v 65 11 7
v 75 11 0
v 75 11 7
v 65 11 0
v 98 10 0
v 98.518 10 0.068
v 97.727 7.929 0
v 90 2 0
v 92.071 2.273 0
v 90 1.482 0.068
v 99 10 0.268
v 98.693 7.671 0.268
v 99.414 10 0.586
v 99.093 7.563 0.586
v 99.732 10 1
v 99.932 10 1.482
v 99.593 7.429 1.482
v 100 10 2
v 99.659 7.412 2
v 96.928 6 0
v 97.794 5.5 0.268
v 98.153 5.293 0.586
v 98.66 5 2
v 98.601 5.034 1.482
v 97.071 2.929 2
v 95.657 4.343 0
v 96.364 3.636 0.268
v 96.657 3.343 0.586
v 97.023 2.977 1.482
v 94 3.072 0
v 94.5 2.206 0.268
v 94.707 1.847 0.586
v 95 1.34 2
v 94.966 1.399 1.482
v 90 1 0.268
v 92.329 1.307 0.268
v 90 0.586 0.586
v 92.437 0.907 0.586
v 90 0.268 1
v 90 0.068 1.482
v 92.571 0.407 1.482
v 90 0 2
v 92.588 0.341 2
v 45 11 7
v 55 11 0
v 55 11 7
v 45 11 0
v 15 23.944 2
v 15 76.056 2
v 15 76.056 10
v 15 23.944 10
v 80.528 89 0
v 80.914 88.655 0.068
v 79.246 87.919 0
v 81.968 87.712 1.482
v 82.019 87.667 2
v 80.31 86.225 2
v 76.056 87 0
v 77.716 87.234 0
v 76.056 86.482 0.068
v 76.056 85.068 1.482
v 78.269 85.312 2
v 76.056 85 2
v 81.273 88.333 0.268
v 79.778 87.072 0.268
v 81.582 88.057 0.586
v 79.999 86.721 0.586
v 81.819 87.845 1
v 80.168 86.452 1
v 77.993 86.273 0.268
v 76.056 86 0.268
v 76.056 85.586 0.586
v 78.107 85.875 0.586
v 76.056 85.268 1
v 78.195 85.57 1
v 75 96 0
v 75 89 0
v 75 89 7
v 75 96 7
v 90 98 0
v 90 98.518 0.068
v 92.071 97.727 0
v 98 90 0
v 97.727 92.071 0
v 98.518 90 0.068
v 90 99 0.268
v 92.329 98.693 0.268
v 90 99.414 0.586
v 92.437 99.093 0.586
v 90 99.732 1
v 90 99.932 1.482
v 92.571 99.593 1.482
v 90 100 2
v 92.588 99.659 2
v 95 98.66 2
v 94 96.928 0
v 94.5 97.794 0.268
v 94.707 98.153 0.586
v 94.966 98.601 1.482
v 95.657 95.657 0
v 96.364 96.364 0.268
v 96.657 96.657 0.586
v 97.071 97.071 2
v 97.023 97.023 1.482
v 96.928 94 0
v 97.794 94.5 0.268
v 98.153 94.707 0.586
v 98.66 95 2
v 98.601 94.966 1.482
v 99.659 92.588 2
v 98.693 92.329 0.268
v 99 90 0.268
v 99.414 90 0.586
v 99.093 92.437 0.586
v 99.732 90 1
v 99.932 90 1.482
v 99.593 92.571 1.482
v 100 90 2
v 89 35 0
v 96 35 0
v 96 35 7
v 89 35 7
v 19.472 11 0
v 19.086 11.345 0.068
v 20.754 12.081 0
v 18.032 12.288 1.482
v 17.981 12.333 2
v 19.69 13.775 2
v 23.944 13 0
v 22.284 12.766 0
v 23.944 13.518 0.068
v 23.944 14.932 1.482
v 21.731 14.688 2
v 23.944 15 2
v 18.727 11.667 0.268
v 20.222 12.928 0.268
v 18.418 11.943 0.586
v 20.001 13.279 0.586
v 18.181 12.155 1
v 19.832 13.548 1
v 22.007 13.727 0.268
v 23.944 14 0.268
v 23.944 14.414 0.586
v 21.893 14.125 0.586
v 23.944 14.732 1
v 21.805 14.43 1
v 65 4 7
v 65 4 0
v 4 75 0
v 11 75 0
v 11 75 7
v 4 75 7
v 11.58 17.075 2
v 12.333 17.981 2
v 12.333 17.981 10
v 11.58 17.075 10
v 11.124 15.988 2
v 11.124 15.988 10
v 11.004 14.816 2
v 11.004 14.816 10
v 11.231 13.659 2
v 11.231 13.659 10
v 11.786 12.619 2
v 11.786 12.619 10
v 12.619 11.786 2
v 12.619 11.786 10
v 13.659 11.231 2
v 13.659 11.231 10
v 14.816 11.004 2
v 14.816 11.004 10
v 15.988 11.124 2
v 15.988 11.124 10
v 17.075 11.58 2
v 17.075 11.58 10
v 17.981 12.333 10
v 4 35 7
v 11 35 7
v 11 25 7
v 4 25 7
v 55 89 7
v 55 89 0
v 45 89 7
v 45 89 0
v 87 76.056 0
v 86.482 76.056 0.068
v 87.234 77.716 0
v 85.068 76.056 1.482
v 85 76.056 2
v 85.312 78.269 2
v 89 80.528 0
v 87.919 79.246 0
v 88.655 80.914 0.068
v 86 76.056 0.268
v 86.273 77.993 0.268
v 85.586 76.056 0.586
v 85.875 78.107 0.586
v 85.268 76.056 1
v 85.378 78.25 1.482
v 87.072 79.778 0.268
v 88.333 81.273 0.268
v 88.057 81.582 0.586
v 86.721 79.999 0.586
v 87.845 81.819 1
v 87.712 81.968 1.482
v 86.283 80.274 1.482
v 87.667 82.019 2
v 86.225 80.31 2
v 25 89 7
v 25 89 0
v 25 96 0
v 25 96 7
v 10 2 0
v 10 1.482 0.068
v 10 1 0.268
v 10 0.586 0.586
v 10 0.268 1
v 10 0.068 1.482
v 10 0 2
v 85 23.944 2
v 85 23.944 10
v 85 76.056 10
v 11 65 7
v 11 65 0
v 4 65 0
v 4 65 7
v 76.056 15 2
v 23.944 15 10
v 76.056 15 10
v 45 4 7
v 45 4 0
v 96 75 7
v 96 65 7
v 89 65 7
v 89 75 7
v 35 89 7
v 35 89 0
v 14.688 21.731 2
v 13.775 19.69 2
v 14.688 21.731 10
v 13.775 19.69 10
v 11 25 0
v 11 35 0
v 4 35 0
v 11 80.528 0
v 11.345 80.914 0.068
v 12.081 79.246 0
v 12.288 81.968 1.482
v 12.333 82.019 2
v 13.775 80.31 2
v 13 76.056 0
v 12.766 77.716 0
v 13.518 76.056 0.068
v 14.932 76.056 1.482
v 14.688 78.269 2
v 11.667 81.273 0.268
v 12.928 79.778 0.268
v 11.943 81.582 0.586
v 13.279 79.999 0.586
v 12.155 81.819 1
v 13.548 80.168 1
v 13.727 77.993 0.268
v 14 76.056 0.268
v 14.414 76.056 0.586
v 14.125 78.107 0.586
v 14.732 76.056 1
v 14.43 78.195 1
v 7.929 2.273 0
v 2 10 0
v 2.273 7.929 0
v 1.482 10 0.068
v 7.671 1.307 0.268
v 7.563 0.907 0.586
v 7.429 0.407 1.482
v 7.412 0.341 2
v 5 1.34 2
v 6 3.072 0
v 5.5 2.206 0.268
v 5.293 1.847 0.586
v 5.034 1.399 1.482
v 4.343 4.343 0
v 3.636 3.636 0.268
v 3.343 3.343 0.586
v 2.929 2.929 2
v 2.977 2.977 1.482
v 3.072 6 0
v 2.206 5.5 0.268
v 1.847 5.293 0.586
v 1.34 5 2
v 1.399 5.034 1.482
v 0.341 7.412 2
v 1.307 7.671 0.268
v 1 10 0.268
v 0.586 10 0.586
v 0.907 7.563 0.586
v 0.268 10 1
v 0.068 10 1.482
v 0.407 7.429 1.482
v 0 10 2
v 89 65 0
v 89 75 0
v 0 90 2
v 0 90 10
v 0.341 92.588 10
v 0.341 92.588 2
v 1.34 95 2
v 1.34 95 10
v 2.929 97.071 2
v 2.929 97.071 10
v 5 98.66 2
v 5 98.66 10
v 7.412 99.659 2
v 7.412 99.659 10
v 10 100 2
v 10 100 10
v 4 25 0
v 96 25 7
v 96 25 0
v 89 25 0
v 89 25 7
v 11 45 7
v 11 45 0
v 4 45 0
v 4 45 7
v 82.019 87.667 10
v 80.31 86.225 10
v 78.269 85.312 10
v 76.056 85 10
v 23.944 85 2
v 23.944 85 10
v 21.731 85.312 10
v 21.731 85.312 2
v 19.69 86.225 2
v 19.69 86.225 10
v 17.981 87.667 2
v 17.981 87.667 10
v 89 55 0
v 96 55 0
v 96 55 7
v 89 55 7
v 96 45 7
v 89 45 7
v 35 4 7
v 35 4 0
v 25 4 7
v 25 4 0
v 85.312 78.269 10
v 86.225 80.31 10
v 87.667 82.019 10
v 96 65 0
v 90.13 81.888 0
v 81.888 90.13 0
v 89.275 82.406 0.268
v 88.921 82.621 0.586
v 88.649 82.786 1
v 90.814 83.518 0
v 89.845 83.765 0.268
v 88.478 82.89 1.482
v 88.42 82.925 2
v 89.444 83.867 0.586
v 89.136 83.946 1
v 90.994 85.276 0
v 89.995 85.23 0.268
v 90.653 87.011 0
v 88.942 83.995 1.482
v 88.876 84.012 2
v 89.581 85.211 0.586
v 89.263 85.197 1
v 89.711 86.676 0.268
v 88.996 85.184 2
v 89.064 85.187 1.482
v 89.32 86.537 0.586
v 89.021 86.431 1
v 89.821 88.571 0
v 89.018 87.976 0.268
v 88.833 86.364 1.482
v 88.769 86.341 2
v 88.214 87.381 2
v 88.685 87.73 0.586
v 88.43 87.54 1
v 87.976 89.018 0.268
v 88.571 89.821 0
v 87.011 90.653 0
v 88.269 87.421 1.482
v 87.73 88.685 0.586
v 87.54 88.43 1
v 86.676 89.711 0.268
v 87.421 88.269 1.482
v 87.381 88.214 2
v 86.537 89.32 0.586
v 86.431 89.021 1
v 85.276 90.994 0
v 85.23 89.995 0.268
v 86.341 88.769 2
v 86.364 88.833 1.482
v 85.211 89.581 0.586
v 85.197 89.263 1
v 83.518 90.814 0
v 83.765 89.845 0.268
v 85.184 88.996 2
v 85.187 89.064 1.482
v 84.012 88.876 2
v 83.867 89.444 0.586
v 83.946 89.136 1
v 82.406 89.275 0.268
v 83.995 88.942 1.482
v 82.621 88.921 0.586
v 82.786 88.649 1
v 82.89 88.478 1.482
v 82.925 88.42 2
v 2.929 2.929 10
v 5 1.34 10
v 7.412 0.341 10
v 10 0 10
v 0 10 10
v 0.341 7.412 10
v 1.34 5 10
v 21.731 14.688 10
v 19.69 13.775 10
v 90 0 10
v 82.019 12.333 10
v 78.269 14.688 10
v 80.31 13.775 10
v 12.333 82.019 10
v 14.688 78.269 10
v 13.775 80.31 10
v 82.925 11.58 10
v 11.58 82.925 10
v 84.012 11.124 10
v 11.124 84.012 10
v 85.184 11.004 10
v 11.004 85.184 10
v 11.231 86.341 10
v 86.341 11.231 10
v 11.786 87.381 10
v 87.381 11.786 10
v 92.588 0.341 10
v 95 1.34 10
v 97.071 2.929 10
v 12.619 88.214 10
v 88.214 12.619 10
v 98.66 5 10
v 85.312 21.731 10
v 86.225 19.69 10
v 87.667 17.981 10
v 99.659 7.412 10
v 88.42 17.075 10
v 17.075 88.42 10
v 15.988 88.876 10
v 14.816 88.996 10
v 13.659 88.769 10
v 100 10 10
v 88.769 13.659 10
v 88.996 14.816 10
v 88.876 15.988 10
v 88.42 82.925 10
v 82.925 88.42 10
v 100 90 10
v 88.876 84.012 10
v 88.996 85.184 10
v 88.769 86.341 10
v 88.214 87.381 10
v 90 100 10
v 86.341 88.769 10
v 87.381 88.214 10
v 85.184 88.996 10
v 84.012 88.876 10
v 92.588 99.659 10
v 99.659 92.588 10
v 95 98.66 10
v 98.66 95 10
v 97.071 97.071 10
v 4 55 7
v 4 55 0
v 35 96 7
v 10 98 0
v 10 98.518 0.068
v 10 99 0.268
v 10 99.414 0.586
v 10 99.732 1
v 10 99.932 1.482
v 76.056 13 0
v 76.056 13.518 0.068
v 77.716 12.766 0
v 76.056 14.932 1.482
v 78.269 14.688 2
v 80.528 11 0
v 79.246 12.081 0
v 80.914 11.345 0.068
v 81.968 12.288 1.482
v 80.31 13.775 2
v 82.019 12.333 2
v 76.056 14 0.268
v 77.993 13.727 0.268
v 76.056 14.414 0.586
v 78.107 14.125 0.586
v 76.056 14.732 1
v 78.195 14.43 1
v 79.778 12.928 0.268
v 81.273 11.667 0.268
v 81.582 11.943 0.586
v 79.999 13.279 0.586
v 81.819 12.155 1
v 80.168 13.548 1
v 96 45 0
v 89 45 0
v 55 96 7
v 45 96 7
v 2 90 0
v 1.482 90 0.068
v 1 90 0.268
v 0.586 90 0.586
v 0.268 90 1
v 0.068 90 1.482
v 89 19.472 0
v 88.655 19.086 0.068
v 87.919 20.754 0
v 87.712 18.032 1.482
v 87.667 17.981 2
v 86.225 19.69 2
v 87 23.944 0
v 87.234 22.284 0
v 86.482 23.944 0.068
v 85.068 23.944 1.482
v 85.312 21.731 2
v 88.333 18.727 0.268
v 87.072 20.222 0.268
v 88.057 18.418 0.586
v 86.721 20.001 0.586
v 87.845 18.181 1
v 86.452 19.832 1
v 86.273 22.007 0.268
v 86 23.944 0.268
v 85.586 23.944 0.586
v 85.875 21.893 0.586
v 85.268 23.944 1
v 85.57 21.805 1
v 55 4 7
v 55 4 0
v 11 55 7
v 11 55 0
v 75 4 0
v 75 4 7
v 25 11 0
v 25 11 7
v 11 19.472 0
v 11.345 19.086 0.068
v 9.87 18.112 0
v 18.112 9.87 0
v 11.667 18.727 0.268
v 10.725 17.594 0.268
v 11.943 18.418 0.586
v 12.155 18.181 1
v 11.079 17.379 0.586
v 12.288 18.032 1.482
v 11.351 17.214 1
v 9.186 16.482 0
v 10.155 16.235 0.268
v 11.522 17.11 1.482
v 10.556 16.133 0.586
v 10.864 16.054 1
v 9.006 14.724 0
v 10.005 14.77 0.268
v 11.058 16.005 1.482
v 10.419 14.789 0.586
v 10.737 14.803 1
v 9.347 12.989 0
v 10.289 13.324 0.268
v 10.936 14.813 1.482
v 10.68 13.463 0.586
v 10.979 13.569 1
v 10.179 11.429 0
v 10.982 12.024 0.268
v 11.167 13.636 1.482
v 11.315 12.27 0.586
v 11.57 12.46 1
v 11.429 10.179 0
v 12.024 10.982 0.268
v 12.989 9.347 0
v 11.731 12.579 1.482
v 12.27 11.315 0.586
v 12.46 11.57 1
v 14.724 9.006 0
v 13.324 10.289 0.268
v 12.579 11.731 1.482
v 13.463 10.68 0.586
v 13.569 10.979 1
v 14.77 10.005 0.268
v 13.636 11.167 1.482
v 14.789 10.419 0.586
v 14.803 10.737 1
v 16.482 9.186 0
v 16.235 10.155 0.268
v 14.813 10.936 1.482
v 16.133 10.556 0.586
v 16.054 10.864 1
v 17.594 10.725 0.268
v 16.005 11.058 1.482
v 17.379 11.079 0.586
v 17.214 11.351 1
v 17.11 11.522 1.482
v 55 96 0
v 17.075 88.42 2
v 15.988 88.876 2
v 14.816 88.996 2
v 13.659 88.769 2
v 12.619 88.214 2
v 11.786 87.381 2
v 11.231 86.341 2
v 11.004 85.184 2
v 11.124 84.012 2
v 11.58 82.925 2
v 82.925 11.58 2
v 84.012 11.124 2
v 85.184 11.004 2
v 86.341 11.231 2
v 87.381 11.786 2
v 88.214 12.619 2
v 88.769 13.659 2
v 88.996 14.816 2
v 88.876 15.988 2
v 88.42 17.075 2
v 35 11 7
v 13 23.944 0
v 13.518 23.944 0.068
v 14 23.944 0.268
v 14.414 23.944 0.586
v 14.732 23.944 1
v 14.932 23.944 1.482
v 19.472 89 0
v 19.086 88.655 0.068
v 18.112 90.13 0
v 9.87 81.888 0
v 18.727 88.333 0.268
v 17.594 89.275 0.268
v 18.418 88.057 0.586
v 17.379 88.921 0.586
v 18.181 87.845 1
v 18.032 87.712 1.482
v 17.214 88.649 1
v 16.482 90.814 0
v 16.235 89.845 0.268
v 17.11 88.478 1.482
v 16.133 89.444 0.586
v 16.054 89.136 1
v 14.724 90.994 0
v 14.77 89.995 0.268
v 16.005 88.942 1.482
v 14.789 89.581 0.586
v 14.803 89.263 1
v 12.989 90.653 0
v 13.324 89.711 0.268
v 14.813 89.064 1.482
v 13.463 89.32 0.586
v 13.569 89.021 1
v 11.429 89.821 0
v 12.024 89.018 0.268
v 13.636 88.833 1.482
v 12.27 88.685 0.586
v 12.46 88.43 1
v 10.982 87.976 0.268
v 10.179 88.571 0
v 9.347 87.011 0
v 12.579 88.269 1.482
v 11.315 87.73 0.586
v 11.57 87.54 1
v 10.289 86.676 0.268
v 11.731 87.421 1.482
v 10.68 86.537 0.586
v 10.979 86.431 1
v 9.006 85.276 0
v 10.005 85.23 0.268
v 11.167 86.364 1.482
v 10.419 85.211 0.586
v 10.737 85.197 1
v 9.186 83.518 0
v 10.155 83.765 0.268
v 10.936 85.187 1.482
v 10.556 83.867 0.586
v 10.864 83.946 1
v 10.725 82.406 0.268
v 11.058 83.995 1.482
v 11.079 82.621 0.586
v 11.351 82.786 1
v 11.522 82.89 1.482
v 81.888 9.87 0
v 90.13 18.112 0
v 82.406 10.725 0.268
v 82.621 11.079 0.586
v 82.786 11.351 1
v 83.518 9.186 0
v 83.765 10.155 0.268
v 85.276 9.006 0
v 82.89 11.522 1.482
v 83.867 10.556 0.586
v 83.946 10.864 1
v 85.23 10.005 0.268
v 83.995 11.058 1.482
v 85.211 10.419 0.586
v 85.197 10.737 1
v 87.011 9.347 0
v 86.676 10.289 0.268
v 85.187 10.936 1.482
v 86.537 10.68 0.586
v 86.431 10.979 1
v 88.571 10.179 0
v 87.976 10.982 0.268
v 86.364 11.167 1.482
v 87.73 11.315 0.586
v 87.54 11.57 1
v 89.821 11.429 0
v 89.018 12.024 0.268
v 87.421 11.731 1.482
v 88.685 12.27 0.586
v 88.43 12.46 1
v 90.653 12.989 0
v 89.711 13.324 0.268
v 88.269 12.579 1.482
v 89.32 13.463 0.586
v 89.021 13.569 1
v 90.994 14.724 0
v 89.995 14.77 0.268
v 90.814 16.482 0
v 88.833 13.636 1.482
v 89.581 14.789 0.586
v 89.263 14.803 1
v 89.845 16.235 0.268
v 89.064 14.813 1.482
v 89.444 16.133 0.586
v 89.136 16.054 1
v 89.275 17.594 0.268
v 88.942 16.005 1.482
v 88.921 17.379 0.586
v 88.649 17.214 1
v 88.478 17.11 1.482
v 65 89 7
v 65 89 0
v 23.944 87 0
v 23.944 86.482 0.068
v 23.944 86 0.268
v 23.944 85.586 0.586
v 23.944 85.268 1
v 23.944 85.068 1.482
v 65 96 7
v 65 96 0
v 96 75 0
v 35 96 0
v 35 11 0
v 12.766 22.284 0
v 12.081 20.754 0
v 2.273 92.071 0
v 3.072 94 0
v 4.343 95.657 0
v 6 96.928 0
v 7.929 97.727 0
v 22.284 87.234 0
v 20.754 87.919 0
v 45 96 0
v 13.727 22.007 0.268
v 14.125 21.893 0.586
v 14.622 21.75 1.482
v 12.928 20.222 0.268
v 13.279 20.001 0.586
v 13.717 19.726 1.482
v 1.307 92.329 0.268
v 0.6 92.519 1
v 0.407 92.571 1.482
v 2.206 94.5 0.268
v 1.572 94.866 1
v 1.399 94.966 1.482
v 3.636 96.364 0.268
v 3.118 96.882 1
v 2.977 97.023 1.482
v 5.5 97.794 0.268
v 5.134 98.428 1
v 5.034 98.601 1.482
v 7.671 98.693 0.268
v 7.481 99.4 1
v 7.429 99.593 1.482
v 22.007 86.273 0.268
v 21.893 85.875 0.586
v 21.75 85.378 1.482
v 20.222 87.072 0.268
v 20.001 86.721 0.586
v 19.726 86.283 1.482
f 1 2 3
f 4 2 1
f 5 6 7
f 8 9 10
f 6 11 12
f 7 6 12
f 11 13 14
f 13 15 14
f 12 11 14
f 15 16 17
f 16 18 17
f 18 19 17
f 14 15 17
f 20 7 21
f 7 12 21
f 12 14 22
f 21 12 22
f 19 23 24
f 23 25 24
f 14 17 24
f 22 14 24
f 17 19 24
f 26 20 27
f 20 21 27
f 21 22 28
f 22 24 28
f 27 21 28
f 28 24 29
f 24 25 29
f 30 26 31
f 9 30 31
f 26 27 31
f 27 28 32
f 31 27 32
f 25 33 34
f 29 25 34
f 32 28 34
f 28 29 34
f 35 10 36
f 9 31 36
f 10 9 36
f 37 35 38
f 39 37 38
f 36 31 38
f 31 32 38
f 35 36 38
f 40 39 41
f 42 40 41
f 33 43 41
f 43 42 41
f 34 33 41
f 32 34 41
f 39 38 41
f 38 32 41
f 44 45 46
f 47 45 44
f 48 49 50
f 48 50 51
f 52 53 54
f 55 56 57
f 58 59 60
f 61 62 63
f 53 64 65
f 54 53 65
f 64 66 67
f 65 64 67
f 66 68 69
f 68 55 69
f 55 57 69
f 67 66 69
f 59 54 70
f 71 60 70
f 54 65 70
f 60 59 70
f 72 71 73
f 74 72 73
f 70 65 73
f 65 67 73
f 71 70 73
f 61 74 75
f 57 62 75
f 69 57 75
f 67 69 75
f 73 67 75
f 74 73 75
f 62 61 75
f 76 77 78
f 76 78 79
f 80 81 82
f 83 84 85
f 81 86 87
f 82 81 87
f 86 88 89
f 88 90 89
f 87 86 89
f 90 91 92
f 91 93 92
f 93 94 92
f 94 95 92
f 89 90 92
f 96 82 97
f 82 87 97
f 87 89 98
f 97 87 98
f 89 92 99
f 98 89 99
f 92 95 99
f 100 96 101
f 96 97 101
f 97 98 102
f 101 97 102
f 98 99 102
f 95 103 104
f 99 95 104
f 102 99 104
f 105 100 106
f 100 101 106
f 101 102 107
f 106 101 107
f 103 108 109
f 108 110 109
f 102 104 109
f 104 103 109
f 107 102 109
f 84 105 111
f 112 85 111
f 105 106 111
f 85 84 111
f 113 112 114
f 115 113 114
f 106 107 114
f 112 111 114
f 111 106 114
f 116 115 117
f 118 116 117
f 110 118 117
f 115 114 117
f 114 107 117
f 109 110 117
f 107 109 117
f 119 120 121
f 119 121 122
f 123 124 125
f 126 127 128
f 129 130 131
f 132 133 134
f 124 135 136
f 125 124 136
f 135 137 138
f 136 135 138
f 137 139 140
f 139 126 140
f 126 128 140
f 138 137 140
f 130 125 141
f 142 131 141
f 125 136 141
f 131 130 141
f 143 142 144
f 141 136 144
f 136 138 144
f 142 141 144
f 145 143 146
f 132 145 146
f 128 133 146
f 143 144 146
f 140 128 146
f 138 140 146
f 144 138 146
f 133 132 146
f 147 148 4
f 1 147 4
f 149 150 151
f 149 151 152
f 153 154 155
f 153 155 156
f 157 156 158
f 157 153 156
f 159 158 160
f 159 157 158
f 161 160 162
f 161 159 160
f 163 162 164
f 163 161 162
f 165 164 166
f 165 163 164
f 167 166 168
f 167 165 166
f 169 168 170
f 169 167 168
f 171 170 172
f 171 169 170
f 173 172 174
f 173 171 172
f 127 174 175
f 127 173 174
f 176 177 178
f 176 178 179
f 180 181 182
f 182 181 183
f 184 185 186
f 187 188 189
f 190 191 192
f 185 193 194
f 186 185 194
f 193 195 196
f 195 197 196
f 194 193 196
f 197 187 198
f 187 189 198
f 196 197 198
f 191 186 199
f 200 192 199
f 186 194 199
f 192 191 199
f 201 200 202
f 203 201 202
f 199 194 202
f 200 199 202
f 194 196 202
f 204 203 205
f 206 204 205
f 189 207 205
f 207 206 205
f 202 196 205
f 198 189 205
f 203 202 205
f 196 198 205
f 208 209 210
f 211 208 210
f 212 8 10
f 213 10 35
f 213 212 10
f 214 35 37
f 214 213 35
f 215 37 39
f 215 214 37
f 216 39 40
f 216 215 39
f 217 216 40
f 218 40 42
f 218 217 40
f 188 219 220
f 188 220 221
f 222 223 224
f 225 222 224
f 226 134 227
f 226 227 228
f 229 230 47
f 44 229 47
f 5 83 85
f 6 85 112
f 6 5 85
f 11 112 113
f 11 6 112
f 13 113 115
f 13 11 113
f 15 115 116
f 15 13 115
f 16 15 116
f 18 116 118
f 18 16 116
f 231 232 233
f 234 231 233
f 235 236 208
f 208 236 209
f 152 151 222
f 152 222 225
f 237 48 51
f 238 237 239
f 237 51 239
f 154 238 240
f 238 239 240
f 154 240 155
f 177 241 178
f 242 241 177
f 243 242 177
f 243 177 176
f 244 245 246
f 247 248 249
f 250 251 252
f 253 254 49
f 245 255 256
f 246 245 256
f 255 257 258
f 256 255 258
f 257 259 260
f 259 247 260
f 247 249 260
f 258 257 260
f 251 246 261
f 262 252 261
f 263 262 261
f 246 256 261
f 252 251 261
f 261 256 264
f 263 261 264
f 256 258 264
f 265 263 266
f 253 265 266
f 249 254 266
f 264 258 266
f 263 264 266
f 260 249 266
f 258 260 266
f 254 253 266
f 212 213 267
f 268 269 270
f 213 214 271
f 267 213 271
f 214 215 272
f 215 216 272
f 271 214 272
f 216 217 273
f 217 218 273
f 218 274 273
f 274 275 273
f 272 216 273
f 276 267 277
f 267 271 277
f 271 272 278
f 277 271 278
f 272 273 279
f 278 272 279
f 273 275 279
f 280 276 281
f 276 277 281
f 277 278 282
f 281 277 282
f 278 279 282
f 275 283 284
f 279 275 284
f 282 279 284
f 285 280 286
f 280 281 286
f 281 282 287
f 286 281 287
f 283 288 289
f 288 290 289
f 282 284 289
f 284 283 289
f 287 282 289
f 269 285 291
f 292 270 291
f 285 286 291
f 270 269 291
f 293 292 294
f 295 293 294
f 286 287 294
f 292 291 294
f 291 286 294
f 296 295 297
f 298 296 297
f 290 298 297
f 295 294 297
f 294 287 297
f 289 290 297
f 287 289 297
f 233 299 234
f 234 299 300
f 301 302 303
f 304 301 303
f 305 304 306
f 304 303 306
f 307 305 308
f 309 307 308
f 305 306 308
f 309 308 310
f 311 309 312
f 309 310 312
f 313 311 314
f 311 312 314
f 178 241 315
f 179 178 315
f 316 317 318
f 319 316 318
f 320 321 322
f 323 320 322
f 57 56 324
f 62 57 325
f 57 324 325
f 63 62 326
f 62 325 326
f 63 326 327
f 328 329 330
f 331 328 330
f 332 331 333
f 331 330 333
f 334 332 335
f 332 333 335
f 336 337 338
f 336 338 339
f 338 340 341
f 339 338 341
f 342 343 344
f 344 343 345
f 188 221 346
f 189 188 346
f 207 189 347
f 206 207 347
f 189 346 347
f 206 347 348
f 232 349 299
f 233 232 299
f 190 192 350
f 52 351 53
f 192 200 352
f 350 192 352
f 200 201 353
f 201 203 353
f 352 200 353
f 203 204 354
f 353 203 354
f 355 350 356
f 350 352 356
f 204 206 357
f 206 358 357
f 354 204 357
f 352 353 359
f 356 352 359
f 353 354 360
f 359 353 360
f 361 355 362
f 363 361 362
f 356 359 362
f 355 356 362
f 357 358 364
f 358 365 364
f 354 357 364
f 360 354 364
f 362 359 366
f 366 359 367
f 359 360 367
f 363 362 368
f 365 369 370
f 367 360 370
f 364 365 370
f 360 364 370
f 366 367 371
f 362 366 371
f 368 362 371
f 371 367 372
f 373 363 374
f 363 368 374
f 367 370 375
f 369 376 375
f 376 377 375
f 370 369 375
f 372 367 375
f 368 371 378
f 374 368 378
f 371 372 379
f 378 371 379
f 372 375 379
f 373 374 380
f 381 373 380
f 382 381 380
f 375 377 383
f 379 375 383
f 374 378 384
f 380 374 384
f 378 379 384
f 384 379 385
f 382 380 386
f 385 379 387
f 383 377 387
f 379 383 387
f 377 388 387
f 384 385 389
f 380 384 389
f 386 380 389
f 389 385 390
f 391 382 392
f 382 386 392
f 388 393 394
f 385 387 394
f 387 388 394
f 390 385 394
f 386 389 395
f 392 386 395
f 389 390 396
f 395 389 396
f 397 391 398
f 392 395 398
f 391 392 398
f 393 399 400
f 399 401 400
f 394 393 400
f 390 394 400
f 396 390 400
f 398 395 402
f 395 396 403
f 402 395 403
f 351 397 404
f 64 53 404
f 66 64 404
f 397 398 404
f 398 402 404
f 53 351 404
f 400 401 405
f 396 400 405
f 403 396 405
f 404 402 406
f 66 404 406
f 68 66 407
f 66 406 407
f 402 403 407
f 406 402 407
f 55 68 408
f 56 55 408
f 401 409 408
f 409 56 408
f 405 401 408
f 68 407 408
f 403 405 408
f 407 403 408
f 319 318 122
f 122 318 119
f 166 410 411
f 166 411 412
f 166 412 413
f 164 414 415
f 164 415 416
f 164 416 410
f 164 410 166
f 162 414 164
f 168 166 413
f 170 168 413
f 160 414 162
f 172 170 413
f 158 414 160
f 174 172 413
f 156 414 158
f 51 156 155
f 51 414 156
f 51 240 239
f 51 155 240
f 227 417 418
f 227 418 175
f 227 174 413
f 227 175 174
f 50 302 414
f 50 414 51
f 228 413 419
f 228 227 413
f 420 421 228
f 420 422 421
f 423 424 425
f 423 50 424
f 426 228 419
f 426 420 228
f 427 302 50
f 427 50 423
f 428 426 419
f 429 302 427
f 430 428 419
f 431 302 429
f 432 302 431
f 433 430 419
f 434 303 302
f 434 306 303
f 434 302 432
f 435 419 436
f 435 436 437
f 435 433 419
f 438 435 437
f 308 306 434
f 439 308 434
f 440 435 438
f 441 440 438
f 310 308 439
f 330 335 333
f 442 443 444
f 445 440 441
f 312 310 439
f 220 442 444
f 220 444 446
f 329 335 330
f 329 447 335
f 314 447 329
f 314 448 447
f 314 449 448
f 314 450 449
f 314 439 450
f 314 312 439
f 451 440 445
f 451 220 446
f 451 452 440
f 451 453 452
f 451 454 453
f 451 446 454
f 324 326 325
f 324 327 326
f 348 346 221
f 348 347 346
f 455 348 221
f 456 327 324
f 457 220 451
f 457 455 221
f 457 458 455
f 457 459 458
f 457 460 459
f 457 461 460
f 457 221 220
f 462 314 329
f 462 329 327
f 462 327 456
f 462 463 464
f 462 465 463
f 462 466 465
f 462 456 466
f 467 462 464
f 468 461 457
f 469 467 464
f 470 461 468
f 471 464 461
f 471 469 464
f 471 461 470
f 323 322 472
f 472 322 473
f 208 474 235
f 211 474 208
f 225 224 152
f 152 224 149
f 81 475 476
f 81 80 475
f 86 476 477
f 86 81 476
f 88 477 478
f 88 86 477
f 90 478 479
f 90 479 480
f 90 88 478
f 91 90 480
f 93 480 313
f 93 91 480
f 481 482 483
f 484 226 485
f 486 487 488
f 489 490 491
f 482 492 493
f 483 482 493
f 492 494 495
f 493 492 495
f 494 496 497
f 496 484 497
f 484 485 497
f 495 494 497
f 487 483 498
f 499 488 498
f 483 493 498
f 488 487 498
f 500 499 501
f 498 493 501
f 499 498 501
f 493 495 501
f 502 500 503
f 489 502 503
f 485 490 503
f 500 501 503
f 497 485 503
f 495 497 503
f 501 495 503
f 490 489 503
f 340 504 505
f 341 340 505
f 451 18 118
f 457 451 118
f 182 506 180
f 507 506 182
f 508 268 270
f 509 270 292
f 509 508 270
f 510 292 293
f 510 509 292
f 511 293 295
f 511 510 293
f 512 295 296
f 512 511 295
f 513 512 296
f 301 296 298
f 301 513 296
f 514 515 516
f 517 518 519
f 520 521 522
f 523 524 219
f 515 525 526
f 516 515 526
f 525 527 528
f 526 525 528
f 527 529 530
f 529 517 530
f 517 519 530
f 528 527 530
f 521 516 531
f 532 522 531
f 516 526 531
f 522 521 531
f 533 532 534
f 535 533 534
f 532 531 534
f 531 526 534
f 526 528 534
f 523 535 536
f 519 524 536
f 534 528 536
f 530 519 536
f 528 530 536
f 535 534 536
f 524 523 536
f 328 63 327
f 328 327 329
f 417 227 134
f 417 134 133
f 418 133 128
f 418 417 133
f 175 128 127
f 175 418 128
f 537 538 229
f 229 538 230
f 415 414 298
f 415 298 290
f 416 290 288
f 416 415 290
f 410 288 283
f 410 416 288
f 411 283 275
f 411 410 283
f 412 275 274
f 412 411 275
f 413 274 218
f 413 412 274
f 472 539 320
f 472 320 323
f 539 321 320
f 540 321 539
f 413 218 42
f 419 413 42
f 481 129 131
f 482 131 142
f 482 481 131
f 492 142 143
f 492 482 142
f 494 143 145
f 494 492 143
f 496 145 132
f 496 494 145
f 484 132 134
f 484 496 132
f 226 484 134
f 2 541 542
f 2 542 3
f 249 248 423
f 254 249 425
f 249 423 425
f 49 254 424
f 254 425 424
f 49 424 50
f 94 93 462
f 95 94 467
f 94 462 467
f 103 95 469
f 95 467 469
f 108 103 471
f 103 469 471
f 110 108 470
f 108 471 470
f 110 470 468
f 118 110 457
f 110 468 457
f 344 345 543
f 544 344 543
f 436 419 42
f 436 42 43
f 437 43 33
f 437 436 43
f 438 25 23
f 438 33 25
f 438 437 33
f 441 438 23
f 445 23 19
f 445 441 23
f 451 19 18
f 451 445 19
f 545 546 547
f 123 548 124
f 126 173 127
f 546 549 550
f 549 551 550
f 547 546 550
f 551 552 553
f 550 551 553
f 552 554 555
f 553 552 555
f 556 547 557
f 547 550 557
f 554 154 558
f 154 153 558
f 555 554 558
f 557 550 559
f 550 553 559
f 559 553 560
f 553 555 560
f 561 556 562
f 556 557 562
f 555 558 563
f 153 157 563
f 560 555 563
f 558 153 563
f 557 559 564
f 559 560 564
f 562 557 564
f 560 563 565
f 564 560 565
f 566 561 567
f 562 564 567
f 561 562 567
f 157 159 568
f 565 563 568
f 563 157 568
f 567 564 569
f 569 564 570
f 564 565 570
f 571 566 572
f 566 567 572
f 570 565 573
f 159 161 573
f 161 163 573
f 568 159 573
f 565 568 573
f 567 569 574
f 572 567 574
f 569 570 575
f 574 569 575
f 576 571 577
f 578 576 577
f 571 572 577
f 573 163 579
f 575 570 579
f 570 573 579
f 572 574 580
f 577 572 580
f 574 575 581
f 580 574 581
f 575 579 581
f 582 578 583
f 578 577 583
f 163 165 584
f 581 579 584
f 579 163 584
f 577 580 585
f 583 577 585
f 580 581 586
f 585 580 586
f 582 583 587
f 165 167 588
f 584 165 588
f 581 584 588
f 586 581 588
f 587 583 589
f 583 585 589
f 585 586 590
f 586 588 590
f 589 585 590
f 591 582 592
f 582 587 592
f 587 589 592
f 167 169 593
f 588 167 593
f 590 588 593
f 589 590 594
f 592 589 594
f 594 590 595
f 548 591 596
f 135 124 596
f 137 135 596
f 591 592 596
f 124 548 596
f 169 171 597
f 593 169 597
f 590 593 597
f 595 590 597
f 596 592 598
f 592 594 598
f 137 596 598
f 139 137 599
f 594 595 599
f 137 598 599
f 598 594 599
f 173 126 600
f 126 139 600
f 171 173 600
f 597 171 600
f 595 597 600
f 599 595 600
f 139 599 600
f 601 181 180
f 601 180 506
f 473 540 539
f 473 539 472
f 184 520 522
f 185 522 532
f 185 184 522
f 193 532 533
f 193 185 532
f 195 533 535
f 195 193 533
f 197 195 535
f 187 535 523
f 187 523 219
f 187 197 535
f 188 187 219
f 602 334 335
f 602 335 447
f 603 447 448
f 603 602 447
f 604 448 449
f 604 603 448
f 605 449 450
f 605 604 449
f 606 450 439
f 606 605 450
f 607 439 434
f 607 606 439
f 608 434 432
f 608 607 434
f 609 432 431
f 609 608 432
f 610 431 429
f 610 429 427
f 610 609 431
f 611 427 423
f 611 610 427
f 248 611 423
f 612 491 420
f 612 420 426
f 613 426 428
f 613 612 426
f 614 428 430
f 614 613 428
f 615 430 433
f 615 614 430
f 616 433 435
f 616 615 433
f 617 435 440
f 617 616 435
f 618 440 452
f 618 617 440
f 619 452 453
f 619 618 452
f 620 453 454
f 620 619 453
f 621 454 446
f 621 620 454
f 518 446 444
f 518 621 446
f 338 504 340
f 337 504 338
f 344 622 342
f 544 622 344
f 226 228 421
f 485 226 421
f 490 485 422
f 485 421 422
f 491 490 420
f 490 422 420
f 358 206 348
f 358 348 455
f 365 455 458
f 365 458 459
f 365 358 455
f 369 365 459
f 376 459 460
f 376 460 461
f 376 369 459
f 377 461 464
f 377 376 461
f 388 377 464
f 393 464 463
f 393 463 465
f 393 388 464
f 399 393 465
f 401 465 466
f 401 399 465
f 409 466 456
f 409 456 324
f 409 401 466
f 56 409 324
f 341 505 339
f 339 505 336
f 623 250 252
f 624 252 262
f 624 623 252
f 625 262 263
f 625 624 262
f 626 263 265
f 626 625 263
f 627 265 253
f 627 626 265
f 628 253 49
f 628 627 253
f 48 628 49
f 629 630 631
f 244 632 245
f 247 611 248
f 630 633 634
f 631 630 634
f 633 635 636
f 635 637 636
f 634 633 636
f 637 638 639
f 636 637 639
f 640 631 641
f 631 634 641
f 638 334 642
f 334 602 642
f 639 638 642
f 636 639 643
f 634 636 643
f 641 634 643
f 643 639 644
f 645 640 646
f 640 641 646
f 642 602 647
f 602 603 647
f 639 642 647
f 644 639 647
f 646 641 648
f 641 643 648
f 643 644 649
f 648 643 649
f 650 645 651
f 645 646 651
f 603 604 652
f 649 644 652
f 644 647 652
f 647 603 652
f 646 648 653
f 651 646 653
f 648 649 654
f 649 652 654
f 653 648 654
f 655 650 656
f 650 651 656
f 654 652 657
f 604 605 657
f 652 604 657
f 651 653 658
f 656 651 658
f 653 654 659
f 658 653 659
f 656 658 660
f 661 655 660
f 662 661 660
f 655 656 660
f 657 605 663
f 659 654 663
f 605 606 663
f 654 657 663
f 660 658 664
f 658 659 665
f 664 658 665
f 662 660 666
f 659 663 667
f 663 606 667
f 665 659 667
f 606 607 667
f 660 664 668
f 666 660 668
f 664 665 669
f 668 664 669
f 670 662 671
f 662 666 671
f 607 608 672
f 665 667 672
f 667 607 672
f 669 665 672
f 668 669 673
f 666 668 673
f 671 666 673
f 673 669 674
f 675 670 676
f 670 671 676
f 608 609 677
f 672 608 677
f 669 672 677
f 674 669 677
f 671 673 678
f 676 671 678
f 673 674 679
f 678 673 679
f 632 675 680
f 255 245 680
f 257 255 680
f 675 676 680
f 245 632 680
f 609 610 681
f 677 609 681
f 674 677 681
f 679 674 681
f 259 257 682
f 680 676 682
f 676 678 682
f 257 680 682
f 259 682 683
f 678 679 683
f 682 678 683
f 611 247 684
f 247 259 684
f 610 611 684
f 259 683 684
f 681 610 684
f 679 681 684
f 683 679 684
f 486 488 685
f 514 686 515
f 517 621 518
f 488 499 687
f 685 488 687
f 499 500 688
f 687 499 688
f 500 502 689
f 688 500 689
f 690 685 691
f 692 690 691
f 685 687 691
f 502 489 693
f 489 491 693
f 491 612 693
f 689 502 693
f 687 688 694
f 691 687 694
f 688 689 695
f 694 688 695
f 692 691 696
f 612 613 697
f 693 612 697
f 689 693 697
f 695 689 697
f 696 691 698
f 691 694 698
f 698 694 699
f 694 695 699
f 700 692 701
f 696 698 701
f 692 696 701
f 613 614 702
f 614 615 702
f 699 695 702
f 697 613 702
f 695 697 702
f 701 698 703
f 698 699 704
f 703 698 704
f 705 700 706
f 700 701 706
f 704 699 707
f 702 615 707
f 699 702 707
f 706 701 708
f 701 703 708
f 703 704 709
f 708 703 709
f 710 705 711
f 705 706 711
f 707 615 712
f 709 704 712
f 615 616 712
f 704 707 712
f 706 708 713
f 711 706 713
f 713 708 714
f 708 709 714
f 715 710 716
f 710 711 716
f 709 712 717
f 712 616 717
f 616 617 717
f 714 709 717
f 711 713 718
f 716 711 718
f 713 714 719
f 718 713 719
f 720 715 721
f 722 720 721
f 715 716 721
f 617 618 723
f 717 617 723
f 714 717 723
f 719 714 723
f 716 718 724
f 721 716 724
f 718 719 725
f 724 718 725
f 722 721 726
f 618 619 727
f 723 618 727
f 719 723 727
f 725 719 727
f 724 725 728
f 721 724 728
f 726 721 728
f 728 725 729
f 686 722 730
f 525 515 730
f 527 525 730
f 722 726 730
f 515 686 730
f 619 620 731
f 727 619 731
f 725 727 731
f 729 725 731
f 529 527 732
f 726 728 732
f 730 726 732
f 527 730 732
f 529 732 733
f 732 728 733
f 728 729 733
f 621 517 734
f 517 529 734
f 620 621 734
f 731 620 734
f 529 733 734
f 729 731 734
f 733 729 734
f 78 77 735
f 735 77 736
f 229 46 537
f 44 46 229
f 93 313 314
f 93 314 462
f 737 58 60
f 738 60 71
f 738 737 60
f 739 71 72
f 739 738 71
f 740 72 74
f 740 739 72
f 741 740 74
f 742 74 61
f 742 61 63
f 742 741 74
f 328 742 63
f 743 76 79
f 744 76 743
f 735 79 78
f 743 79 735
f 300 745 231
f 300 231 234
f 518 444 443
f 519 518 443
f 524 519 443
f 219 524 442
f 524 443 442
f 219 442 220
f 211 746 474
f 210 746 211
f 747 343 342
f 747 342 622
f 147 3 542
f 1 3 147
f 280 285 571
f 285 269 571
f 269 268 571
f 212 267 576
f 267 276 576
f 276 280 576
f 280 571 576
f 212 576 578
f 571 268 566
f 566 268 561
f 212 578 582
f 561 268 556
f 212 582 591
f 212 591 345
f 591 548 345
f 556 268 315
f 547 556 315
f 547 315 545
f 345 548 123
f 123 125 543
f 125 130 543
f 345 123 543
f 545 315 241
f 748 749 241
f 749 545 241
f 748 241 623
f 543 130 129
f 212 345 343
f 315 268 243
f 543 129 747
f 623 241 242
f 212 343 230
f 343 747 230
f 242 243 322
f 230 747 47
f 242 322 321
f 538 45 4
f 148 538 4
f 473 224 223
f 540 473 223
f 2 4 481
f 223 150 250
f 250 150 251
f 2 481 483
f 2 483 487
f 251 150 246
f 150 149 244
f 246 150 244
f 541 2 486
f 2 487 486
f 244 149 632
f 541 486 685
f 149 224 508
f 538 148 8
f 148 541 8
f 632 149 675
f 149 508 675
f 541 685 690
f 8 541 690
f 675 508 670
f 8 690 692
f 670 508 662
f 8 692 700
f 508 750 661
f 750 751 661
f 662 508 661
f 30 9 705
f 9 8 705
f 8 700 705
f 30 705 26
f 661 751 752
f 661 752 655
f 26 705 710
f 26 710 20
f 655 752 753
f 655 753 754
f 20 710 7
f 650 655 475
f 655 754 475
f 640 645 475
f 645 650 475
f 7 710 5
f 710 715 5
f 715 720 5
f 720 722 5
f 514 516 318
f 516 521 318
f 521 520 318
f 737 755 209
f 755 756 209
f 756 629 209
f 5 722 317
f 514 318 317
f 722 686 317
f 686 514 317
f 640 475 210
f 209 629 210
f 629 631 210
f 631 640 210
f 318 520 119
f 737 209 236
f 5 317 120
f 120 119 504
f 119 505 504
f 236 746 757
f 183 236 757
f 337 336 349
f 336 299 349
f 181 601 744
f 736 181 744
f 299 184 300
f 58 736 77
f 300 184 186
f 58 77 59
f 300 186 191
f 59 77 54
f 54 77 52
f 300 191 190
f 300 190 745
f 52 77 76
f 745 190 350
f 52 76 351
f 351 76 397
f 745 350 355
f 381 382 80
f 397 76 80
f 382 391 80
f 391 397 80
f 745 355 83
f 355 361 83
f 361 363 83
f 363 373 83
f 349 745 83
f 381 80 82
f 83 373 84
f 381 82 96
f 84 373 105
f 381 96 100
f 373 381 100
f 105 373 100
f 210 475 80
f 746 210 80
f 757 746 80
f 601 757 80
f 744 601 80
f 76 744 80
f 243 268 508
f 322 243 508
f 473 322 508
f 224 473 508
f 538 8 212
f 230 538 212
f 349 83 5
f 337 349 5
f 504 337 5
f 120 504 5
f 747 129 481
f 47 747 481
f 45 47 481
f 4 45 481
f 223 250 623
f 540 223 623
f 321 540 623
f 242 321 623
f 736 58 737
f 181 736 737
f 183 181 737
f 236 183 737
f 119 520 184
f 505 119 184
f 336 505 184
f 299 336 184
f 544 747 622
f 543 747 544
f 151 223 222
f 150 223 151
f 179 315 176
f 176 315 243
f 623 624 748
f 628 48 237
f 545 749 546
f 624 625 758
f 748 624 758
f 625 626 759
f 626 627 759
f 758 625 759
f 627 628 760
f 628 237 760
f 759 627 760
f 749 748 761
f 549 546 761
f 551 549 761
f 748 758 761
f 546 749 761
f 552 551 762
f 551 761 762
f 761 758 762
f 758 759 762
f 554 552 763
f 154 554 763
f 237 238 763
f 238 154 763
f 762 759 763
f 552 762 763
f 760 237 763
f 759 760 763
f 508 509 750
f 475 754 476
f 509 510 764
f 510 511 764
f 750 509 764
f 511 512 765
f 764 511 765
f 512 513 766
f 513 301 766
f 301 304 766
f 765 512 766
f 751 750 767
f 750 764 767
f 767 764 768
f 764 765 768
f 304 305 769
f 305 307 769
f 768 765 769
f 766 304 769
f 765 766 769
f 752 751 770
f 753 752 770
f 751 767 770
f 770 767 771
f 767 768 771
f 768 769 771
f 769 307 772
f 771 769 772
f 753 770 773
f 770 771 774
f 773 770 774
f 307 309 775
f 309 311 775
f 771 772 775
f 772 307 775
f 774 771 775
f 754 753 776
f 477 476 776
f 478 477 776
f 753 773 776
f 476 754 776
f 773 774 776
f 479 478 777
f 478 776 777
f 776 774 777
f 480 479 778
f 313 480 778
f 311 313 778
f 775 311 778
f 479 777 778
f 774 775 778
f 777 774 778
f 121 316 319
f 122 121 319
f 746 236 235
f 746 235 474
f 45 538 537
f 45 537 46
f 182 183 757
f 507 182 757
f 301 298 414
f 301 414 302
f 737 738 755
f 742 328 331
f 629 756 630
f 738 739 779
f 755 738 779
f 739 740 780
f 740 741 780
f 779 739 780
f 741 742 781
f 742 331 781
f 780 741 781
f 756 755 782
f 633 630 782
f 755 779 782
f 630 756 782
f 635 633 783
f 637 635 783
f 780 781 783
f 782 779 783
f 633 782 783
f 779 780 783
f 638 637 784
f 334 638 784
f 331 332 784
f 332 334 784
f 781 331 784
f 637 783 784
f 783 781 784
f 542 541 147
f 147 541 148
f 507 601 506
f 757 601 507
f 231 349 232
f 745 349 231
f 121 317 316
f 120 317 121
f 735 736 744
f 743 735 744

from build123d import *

# Parameters (mm, degrees)
CROQUIS1_W              = 100
CROQUIS1_H              = 100
SALIENTE_EXTRUIR1_DEPTH = 10
REDONDEO1_R             = 8
REDONDEO2_R             = 10
REDONDEO3_R             = 2
CROQUIS2_W              = 10
CROQUIS2_H              = 7
CROQUIS2_W_2            = 7
CROQUIS2_H_2            = 10
CORTAR_EXTRUIR1_DEPTH   = 7


with BuildPart() as part:
    # Croquis1 → Saliente-Extruir1 (new body)
    with BuildSketch(Plane.XY):
        with Locations((50, 50)):
            Rectangle(CROQUIS1_W, CROQUIS1_H)
        with BuildLine():
            Line((19, 15), (81, 15))
            ThreePointArc((81, 15), (87.828427125, 12.171572875), (85, 19))
            Line((85, 19), (85, 81))
            ThreePointArc((85, 81), (87.828427125, 87.828427125), (81, 85))
            Line((81, 85), (19, 85))
            ThreePointArc((19, 85), (12.171572875, 87.828427125), (15, 81))
            Line((15, 81), (15, 19))
            ThreePointArc((15, 19), (12.171572875, 12.171572875), (19, 15))
        make_face(mode=Mode.SUBTRACT)
    extrude(amount=SALIENTE_EXTRUIR1_DEPTH)

    # Redondeo1
    redondeo1_edges = [part.edges().sort_by_distance(p)[0] for p in [
        (15, 19, 5),
        (19, 15, 5),
        (81, 15, 5),
        (85, 19, 5),
        (85, 81, 5),
        (81, 85, 5),
        (19, 85, 5),
        (15, 81, 5),
    ]]
    fillet(redondeo1_edges, radius=REDONDEO1_R)

    # Redondeo2
    redondeo2_edges = [part.edges().sort_by_distance(p)[0] for p in [
        (0, 100, 5),
        (100, 100, 5),
        (100, 0, 5),
        (0, 0, 5),
    ]]
    fillet(redondeo2_edges, radius=REDONDEO2_R)

    # Redondeo3
    redondeo3_edges = [part.edges().sort_by_distance(p)[0] for p in [
        (87.828427125, 12.171572875, 0),
        (15, 50, 0),
        (12.171572875, 12.171572875, 0),
        (50, 15, 0),
        (85, 50, 0),
        (87.828427125, 87.828427125, 0),
        (50, 85, 0),
        (12.171572875, 87.828427125, 0),
        (85.697032567, 79.321714414, 0),
        (79.321714414, 85.697032567, 0),
        (20.678285586, 85.697032567, 0),
        (14.302967433, 79.321714414, 0),
        (20.678285586, 14.302967433, 0),
        (14.302967433, 20.678285586, 0),
        (79.321714414, 14.302967433, 0),
        (85.697032567, 20.678285586, 0),
        (50, 100, 0),
        (0, 50, 0),
        (100, 50, 0),
        (50, 0, 0),
        (97.071067812, 2.928932188, 0),
        (2.928932188, 2.928932188, 0),
        (2.928932188, 97.071067812, 0),
        (97.071067812, 97.071067812, 0),
    ]]
    fillet(redondeo3_edges, radius=REDONDEO3_R)

    # Croquis2 → Cortar-Extruir1 (cut)
    with BuildSketch(Plane(origin=(0, 0, 0), x_dir=(-1, 0, 0), z_dir=(0, 0, -1))):
        with Locations((-30, 7.5)):
            Rectangle(CROQUIS2_W, CROQUIS2_H)
        with Locations((-50, 7.5)):
            Rectangle(CROQUIS2_W, CROQUIS2_H)
        with Locations((-70, 7.5)):
            Rectangle(CROQUIS2_W, CROQUIS2_H)
        with Locations((-92.5, 30)):
            Rectangle(CROQUIS2_W_2, CROQUIS2_H_2)
        with Locations((-92.5, 50)):
            Rectangle(CROQUIS2_W_2, CROQUIS2_H_2)
        with Locations((-92.5, 70)):
            Rectangle(CROQUIS2_W_2, CROQUIS2_H_2)
        with Locations((-7.5, 30)):
            Rectangle(CROQUIS2_W_2, CROQUIS2_H_2)
        with Locations((-7.5, 50)):
            Rectangle(CROQUIS2_W_2, CROQUIS2_H_2)
        with Locations((-7.5, 70)):
            Rectangle(CROQUIS2_W_2, CROQUIS2_H_2)
        with Locations((-30, 92.5)):
            Rectangle(CROQUIS2_W, CROQUIS2_H)
        with Locations((-50, 92.5)):
            Rectangle(CROQUIS2_W, CROQUIS2_H)
        with Locations((-70, 92.5)):
            Rectangle(CROQUIS2_W, CROQUIS2_H)
    extrude(amount=-CORTAR_EXTRUIR1_DEPTH, mode=Mode.SUBTRACT)


solid = part.part
